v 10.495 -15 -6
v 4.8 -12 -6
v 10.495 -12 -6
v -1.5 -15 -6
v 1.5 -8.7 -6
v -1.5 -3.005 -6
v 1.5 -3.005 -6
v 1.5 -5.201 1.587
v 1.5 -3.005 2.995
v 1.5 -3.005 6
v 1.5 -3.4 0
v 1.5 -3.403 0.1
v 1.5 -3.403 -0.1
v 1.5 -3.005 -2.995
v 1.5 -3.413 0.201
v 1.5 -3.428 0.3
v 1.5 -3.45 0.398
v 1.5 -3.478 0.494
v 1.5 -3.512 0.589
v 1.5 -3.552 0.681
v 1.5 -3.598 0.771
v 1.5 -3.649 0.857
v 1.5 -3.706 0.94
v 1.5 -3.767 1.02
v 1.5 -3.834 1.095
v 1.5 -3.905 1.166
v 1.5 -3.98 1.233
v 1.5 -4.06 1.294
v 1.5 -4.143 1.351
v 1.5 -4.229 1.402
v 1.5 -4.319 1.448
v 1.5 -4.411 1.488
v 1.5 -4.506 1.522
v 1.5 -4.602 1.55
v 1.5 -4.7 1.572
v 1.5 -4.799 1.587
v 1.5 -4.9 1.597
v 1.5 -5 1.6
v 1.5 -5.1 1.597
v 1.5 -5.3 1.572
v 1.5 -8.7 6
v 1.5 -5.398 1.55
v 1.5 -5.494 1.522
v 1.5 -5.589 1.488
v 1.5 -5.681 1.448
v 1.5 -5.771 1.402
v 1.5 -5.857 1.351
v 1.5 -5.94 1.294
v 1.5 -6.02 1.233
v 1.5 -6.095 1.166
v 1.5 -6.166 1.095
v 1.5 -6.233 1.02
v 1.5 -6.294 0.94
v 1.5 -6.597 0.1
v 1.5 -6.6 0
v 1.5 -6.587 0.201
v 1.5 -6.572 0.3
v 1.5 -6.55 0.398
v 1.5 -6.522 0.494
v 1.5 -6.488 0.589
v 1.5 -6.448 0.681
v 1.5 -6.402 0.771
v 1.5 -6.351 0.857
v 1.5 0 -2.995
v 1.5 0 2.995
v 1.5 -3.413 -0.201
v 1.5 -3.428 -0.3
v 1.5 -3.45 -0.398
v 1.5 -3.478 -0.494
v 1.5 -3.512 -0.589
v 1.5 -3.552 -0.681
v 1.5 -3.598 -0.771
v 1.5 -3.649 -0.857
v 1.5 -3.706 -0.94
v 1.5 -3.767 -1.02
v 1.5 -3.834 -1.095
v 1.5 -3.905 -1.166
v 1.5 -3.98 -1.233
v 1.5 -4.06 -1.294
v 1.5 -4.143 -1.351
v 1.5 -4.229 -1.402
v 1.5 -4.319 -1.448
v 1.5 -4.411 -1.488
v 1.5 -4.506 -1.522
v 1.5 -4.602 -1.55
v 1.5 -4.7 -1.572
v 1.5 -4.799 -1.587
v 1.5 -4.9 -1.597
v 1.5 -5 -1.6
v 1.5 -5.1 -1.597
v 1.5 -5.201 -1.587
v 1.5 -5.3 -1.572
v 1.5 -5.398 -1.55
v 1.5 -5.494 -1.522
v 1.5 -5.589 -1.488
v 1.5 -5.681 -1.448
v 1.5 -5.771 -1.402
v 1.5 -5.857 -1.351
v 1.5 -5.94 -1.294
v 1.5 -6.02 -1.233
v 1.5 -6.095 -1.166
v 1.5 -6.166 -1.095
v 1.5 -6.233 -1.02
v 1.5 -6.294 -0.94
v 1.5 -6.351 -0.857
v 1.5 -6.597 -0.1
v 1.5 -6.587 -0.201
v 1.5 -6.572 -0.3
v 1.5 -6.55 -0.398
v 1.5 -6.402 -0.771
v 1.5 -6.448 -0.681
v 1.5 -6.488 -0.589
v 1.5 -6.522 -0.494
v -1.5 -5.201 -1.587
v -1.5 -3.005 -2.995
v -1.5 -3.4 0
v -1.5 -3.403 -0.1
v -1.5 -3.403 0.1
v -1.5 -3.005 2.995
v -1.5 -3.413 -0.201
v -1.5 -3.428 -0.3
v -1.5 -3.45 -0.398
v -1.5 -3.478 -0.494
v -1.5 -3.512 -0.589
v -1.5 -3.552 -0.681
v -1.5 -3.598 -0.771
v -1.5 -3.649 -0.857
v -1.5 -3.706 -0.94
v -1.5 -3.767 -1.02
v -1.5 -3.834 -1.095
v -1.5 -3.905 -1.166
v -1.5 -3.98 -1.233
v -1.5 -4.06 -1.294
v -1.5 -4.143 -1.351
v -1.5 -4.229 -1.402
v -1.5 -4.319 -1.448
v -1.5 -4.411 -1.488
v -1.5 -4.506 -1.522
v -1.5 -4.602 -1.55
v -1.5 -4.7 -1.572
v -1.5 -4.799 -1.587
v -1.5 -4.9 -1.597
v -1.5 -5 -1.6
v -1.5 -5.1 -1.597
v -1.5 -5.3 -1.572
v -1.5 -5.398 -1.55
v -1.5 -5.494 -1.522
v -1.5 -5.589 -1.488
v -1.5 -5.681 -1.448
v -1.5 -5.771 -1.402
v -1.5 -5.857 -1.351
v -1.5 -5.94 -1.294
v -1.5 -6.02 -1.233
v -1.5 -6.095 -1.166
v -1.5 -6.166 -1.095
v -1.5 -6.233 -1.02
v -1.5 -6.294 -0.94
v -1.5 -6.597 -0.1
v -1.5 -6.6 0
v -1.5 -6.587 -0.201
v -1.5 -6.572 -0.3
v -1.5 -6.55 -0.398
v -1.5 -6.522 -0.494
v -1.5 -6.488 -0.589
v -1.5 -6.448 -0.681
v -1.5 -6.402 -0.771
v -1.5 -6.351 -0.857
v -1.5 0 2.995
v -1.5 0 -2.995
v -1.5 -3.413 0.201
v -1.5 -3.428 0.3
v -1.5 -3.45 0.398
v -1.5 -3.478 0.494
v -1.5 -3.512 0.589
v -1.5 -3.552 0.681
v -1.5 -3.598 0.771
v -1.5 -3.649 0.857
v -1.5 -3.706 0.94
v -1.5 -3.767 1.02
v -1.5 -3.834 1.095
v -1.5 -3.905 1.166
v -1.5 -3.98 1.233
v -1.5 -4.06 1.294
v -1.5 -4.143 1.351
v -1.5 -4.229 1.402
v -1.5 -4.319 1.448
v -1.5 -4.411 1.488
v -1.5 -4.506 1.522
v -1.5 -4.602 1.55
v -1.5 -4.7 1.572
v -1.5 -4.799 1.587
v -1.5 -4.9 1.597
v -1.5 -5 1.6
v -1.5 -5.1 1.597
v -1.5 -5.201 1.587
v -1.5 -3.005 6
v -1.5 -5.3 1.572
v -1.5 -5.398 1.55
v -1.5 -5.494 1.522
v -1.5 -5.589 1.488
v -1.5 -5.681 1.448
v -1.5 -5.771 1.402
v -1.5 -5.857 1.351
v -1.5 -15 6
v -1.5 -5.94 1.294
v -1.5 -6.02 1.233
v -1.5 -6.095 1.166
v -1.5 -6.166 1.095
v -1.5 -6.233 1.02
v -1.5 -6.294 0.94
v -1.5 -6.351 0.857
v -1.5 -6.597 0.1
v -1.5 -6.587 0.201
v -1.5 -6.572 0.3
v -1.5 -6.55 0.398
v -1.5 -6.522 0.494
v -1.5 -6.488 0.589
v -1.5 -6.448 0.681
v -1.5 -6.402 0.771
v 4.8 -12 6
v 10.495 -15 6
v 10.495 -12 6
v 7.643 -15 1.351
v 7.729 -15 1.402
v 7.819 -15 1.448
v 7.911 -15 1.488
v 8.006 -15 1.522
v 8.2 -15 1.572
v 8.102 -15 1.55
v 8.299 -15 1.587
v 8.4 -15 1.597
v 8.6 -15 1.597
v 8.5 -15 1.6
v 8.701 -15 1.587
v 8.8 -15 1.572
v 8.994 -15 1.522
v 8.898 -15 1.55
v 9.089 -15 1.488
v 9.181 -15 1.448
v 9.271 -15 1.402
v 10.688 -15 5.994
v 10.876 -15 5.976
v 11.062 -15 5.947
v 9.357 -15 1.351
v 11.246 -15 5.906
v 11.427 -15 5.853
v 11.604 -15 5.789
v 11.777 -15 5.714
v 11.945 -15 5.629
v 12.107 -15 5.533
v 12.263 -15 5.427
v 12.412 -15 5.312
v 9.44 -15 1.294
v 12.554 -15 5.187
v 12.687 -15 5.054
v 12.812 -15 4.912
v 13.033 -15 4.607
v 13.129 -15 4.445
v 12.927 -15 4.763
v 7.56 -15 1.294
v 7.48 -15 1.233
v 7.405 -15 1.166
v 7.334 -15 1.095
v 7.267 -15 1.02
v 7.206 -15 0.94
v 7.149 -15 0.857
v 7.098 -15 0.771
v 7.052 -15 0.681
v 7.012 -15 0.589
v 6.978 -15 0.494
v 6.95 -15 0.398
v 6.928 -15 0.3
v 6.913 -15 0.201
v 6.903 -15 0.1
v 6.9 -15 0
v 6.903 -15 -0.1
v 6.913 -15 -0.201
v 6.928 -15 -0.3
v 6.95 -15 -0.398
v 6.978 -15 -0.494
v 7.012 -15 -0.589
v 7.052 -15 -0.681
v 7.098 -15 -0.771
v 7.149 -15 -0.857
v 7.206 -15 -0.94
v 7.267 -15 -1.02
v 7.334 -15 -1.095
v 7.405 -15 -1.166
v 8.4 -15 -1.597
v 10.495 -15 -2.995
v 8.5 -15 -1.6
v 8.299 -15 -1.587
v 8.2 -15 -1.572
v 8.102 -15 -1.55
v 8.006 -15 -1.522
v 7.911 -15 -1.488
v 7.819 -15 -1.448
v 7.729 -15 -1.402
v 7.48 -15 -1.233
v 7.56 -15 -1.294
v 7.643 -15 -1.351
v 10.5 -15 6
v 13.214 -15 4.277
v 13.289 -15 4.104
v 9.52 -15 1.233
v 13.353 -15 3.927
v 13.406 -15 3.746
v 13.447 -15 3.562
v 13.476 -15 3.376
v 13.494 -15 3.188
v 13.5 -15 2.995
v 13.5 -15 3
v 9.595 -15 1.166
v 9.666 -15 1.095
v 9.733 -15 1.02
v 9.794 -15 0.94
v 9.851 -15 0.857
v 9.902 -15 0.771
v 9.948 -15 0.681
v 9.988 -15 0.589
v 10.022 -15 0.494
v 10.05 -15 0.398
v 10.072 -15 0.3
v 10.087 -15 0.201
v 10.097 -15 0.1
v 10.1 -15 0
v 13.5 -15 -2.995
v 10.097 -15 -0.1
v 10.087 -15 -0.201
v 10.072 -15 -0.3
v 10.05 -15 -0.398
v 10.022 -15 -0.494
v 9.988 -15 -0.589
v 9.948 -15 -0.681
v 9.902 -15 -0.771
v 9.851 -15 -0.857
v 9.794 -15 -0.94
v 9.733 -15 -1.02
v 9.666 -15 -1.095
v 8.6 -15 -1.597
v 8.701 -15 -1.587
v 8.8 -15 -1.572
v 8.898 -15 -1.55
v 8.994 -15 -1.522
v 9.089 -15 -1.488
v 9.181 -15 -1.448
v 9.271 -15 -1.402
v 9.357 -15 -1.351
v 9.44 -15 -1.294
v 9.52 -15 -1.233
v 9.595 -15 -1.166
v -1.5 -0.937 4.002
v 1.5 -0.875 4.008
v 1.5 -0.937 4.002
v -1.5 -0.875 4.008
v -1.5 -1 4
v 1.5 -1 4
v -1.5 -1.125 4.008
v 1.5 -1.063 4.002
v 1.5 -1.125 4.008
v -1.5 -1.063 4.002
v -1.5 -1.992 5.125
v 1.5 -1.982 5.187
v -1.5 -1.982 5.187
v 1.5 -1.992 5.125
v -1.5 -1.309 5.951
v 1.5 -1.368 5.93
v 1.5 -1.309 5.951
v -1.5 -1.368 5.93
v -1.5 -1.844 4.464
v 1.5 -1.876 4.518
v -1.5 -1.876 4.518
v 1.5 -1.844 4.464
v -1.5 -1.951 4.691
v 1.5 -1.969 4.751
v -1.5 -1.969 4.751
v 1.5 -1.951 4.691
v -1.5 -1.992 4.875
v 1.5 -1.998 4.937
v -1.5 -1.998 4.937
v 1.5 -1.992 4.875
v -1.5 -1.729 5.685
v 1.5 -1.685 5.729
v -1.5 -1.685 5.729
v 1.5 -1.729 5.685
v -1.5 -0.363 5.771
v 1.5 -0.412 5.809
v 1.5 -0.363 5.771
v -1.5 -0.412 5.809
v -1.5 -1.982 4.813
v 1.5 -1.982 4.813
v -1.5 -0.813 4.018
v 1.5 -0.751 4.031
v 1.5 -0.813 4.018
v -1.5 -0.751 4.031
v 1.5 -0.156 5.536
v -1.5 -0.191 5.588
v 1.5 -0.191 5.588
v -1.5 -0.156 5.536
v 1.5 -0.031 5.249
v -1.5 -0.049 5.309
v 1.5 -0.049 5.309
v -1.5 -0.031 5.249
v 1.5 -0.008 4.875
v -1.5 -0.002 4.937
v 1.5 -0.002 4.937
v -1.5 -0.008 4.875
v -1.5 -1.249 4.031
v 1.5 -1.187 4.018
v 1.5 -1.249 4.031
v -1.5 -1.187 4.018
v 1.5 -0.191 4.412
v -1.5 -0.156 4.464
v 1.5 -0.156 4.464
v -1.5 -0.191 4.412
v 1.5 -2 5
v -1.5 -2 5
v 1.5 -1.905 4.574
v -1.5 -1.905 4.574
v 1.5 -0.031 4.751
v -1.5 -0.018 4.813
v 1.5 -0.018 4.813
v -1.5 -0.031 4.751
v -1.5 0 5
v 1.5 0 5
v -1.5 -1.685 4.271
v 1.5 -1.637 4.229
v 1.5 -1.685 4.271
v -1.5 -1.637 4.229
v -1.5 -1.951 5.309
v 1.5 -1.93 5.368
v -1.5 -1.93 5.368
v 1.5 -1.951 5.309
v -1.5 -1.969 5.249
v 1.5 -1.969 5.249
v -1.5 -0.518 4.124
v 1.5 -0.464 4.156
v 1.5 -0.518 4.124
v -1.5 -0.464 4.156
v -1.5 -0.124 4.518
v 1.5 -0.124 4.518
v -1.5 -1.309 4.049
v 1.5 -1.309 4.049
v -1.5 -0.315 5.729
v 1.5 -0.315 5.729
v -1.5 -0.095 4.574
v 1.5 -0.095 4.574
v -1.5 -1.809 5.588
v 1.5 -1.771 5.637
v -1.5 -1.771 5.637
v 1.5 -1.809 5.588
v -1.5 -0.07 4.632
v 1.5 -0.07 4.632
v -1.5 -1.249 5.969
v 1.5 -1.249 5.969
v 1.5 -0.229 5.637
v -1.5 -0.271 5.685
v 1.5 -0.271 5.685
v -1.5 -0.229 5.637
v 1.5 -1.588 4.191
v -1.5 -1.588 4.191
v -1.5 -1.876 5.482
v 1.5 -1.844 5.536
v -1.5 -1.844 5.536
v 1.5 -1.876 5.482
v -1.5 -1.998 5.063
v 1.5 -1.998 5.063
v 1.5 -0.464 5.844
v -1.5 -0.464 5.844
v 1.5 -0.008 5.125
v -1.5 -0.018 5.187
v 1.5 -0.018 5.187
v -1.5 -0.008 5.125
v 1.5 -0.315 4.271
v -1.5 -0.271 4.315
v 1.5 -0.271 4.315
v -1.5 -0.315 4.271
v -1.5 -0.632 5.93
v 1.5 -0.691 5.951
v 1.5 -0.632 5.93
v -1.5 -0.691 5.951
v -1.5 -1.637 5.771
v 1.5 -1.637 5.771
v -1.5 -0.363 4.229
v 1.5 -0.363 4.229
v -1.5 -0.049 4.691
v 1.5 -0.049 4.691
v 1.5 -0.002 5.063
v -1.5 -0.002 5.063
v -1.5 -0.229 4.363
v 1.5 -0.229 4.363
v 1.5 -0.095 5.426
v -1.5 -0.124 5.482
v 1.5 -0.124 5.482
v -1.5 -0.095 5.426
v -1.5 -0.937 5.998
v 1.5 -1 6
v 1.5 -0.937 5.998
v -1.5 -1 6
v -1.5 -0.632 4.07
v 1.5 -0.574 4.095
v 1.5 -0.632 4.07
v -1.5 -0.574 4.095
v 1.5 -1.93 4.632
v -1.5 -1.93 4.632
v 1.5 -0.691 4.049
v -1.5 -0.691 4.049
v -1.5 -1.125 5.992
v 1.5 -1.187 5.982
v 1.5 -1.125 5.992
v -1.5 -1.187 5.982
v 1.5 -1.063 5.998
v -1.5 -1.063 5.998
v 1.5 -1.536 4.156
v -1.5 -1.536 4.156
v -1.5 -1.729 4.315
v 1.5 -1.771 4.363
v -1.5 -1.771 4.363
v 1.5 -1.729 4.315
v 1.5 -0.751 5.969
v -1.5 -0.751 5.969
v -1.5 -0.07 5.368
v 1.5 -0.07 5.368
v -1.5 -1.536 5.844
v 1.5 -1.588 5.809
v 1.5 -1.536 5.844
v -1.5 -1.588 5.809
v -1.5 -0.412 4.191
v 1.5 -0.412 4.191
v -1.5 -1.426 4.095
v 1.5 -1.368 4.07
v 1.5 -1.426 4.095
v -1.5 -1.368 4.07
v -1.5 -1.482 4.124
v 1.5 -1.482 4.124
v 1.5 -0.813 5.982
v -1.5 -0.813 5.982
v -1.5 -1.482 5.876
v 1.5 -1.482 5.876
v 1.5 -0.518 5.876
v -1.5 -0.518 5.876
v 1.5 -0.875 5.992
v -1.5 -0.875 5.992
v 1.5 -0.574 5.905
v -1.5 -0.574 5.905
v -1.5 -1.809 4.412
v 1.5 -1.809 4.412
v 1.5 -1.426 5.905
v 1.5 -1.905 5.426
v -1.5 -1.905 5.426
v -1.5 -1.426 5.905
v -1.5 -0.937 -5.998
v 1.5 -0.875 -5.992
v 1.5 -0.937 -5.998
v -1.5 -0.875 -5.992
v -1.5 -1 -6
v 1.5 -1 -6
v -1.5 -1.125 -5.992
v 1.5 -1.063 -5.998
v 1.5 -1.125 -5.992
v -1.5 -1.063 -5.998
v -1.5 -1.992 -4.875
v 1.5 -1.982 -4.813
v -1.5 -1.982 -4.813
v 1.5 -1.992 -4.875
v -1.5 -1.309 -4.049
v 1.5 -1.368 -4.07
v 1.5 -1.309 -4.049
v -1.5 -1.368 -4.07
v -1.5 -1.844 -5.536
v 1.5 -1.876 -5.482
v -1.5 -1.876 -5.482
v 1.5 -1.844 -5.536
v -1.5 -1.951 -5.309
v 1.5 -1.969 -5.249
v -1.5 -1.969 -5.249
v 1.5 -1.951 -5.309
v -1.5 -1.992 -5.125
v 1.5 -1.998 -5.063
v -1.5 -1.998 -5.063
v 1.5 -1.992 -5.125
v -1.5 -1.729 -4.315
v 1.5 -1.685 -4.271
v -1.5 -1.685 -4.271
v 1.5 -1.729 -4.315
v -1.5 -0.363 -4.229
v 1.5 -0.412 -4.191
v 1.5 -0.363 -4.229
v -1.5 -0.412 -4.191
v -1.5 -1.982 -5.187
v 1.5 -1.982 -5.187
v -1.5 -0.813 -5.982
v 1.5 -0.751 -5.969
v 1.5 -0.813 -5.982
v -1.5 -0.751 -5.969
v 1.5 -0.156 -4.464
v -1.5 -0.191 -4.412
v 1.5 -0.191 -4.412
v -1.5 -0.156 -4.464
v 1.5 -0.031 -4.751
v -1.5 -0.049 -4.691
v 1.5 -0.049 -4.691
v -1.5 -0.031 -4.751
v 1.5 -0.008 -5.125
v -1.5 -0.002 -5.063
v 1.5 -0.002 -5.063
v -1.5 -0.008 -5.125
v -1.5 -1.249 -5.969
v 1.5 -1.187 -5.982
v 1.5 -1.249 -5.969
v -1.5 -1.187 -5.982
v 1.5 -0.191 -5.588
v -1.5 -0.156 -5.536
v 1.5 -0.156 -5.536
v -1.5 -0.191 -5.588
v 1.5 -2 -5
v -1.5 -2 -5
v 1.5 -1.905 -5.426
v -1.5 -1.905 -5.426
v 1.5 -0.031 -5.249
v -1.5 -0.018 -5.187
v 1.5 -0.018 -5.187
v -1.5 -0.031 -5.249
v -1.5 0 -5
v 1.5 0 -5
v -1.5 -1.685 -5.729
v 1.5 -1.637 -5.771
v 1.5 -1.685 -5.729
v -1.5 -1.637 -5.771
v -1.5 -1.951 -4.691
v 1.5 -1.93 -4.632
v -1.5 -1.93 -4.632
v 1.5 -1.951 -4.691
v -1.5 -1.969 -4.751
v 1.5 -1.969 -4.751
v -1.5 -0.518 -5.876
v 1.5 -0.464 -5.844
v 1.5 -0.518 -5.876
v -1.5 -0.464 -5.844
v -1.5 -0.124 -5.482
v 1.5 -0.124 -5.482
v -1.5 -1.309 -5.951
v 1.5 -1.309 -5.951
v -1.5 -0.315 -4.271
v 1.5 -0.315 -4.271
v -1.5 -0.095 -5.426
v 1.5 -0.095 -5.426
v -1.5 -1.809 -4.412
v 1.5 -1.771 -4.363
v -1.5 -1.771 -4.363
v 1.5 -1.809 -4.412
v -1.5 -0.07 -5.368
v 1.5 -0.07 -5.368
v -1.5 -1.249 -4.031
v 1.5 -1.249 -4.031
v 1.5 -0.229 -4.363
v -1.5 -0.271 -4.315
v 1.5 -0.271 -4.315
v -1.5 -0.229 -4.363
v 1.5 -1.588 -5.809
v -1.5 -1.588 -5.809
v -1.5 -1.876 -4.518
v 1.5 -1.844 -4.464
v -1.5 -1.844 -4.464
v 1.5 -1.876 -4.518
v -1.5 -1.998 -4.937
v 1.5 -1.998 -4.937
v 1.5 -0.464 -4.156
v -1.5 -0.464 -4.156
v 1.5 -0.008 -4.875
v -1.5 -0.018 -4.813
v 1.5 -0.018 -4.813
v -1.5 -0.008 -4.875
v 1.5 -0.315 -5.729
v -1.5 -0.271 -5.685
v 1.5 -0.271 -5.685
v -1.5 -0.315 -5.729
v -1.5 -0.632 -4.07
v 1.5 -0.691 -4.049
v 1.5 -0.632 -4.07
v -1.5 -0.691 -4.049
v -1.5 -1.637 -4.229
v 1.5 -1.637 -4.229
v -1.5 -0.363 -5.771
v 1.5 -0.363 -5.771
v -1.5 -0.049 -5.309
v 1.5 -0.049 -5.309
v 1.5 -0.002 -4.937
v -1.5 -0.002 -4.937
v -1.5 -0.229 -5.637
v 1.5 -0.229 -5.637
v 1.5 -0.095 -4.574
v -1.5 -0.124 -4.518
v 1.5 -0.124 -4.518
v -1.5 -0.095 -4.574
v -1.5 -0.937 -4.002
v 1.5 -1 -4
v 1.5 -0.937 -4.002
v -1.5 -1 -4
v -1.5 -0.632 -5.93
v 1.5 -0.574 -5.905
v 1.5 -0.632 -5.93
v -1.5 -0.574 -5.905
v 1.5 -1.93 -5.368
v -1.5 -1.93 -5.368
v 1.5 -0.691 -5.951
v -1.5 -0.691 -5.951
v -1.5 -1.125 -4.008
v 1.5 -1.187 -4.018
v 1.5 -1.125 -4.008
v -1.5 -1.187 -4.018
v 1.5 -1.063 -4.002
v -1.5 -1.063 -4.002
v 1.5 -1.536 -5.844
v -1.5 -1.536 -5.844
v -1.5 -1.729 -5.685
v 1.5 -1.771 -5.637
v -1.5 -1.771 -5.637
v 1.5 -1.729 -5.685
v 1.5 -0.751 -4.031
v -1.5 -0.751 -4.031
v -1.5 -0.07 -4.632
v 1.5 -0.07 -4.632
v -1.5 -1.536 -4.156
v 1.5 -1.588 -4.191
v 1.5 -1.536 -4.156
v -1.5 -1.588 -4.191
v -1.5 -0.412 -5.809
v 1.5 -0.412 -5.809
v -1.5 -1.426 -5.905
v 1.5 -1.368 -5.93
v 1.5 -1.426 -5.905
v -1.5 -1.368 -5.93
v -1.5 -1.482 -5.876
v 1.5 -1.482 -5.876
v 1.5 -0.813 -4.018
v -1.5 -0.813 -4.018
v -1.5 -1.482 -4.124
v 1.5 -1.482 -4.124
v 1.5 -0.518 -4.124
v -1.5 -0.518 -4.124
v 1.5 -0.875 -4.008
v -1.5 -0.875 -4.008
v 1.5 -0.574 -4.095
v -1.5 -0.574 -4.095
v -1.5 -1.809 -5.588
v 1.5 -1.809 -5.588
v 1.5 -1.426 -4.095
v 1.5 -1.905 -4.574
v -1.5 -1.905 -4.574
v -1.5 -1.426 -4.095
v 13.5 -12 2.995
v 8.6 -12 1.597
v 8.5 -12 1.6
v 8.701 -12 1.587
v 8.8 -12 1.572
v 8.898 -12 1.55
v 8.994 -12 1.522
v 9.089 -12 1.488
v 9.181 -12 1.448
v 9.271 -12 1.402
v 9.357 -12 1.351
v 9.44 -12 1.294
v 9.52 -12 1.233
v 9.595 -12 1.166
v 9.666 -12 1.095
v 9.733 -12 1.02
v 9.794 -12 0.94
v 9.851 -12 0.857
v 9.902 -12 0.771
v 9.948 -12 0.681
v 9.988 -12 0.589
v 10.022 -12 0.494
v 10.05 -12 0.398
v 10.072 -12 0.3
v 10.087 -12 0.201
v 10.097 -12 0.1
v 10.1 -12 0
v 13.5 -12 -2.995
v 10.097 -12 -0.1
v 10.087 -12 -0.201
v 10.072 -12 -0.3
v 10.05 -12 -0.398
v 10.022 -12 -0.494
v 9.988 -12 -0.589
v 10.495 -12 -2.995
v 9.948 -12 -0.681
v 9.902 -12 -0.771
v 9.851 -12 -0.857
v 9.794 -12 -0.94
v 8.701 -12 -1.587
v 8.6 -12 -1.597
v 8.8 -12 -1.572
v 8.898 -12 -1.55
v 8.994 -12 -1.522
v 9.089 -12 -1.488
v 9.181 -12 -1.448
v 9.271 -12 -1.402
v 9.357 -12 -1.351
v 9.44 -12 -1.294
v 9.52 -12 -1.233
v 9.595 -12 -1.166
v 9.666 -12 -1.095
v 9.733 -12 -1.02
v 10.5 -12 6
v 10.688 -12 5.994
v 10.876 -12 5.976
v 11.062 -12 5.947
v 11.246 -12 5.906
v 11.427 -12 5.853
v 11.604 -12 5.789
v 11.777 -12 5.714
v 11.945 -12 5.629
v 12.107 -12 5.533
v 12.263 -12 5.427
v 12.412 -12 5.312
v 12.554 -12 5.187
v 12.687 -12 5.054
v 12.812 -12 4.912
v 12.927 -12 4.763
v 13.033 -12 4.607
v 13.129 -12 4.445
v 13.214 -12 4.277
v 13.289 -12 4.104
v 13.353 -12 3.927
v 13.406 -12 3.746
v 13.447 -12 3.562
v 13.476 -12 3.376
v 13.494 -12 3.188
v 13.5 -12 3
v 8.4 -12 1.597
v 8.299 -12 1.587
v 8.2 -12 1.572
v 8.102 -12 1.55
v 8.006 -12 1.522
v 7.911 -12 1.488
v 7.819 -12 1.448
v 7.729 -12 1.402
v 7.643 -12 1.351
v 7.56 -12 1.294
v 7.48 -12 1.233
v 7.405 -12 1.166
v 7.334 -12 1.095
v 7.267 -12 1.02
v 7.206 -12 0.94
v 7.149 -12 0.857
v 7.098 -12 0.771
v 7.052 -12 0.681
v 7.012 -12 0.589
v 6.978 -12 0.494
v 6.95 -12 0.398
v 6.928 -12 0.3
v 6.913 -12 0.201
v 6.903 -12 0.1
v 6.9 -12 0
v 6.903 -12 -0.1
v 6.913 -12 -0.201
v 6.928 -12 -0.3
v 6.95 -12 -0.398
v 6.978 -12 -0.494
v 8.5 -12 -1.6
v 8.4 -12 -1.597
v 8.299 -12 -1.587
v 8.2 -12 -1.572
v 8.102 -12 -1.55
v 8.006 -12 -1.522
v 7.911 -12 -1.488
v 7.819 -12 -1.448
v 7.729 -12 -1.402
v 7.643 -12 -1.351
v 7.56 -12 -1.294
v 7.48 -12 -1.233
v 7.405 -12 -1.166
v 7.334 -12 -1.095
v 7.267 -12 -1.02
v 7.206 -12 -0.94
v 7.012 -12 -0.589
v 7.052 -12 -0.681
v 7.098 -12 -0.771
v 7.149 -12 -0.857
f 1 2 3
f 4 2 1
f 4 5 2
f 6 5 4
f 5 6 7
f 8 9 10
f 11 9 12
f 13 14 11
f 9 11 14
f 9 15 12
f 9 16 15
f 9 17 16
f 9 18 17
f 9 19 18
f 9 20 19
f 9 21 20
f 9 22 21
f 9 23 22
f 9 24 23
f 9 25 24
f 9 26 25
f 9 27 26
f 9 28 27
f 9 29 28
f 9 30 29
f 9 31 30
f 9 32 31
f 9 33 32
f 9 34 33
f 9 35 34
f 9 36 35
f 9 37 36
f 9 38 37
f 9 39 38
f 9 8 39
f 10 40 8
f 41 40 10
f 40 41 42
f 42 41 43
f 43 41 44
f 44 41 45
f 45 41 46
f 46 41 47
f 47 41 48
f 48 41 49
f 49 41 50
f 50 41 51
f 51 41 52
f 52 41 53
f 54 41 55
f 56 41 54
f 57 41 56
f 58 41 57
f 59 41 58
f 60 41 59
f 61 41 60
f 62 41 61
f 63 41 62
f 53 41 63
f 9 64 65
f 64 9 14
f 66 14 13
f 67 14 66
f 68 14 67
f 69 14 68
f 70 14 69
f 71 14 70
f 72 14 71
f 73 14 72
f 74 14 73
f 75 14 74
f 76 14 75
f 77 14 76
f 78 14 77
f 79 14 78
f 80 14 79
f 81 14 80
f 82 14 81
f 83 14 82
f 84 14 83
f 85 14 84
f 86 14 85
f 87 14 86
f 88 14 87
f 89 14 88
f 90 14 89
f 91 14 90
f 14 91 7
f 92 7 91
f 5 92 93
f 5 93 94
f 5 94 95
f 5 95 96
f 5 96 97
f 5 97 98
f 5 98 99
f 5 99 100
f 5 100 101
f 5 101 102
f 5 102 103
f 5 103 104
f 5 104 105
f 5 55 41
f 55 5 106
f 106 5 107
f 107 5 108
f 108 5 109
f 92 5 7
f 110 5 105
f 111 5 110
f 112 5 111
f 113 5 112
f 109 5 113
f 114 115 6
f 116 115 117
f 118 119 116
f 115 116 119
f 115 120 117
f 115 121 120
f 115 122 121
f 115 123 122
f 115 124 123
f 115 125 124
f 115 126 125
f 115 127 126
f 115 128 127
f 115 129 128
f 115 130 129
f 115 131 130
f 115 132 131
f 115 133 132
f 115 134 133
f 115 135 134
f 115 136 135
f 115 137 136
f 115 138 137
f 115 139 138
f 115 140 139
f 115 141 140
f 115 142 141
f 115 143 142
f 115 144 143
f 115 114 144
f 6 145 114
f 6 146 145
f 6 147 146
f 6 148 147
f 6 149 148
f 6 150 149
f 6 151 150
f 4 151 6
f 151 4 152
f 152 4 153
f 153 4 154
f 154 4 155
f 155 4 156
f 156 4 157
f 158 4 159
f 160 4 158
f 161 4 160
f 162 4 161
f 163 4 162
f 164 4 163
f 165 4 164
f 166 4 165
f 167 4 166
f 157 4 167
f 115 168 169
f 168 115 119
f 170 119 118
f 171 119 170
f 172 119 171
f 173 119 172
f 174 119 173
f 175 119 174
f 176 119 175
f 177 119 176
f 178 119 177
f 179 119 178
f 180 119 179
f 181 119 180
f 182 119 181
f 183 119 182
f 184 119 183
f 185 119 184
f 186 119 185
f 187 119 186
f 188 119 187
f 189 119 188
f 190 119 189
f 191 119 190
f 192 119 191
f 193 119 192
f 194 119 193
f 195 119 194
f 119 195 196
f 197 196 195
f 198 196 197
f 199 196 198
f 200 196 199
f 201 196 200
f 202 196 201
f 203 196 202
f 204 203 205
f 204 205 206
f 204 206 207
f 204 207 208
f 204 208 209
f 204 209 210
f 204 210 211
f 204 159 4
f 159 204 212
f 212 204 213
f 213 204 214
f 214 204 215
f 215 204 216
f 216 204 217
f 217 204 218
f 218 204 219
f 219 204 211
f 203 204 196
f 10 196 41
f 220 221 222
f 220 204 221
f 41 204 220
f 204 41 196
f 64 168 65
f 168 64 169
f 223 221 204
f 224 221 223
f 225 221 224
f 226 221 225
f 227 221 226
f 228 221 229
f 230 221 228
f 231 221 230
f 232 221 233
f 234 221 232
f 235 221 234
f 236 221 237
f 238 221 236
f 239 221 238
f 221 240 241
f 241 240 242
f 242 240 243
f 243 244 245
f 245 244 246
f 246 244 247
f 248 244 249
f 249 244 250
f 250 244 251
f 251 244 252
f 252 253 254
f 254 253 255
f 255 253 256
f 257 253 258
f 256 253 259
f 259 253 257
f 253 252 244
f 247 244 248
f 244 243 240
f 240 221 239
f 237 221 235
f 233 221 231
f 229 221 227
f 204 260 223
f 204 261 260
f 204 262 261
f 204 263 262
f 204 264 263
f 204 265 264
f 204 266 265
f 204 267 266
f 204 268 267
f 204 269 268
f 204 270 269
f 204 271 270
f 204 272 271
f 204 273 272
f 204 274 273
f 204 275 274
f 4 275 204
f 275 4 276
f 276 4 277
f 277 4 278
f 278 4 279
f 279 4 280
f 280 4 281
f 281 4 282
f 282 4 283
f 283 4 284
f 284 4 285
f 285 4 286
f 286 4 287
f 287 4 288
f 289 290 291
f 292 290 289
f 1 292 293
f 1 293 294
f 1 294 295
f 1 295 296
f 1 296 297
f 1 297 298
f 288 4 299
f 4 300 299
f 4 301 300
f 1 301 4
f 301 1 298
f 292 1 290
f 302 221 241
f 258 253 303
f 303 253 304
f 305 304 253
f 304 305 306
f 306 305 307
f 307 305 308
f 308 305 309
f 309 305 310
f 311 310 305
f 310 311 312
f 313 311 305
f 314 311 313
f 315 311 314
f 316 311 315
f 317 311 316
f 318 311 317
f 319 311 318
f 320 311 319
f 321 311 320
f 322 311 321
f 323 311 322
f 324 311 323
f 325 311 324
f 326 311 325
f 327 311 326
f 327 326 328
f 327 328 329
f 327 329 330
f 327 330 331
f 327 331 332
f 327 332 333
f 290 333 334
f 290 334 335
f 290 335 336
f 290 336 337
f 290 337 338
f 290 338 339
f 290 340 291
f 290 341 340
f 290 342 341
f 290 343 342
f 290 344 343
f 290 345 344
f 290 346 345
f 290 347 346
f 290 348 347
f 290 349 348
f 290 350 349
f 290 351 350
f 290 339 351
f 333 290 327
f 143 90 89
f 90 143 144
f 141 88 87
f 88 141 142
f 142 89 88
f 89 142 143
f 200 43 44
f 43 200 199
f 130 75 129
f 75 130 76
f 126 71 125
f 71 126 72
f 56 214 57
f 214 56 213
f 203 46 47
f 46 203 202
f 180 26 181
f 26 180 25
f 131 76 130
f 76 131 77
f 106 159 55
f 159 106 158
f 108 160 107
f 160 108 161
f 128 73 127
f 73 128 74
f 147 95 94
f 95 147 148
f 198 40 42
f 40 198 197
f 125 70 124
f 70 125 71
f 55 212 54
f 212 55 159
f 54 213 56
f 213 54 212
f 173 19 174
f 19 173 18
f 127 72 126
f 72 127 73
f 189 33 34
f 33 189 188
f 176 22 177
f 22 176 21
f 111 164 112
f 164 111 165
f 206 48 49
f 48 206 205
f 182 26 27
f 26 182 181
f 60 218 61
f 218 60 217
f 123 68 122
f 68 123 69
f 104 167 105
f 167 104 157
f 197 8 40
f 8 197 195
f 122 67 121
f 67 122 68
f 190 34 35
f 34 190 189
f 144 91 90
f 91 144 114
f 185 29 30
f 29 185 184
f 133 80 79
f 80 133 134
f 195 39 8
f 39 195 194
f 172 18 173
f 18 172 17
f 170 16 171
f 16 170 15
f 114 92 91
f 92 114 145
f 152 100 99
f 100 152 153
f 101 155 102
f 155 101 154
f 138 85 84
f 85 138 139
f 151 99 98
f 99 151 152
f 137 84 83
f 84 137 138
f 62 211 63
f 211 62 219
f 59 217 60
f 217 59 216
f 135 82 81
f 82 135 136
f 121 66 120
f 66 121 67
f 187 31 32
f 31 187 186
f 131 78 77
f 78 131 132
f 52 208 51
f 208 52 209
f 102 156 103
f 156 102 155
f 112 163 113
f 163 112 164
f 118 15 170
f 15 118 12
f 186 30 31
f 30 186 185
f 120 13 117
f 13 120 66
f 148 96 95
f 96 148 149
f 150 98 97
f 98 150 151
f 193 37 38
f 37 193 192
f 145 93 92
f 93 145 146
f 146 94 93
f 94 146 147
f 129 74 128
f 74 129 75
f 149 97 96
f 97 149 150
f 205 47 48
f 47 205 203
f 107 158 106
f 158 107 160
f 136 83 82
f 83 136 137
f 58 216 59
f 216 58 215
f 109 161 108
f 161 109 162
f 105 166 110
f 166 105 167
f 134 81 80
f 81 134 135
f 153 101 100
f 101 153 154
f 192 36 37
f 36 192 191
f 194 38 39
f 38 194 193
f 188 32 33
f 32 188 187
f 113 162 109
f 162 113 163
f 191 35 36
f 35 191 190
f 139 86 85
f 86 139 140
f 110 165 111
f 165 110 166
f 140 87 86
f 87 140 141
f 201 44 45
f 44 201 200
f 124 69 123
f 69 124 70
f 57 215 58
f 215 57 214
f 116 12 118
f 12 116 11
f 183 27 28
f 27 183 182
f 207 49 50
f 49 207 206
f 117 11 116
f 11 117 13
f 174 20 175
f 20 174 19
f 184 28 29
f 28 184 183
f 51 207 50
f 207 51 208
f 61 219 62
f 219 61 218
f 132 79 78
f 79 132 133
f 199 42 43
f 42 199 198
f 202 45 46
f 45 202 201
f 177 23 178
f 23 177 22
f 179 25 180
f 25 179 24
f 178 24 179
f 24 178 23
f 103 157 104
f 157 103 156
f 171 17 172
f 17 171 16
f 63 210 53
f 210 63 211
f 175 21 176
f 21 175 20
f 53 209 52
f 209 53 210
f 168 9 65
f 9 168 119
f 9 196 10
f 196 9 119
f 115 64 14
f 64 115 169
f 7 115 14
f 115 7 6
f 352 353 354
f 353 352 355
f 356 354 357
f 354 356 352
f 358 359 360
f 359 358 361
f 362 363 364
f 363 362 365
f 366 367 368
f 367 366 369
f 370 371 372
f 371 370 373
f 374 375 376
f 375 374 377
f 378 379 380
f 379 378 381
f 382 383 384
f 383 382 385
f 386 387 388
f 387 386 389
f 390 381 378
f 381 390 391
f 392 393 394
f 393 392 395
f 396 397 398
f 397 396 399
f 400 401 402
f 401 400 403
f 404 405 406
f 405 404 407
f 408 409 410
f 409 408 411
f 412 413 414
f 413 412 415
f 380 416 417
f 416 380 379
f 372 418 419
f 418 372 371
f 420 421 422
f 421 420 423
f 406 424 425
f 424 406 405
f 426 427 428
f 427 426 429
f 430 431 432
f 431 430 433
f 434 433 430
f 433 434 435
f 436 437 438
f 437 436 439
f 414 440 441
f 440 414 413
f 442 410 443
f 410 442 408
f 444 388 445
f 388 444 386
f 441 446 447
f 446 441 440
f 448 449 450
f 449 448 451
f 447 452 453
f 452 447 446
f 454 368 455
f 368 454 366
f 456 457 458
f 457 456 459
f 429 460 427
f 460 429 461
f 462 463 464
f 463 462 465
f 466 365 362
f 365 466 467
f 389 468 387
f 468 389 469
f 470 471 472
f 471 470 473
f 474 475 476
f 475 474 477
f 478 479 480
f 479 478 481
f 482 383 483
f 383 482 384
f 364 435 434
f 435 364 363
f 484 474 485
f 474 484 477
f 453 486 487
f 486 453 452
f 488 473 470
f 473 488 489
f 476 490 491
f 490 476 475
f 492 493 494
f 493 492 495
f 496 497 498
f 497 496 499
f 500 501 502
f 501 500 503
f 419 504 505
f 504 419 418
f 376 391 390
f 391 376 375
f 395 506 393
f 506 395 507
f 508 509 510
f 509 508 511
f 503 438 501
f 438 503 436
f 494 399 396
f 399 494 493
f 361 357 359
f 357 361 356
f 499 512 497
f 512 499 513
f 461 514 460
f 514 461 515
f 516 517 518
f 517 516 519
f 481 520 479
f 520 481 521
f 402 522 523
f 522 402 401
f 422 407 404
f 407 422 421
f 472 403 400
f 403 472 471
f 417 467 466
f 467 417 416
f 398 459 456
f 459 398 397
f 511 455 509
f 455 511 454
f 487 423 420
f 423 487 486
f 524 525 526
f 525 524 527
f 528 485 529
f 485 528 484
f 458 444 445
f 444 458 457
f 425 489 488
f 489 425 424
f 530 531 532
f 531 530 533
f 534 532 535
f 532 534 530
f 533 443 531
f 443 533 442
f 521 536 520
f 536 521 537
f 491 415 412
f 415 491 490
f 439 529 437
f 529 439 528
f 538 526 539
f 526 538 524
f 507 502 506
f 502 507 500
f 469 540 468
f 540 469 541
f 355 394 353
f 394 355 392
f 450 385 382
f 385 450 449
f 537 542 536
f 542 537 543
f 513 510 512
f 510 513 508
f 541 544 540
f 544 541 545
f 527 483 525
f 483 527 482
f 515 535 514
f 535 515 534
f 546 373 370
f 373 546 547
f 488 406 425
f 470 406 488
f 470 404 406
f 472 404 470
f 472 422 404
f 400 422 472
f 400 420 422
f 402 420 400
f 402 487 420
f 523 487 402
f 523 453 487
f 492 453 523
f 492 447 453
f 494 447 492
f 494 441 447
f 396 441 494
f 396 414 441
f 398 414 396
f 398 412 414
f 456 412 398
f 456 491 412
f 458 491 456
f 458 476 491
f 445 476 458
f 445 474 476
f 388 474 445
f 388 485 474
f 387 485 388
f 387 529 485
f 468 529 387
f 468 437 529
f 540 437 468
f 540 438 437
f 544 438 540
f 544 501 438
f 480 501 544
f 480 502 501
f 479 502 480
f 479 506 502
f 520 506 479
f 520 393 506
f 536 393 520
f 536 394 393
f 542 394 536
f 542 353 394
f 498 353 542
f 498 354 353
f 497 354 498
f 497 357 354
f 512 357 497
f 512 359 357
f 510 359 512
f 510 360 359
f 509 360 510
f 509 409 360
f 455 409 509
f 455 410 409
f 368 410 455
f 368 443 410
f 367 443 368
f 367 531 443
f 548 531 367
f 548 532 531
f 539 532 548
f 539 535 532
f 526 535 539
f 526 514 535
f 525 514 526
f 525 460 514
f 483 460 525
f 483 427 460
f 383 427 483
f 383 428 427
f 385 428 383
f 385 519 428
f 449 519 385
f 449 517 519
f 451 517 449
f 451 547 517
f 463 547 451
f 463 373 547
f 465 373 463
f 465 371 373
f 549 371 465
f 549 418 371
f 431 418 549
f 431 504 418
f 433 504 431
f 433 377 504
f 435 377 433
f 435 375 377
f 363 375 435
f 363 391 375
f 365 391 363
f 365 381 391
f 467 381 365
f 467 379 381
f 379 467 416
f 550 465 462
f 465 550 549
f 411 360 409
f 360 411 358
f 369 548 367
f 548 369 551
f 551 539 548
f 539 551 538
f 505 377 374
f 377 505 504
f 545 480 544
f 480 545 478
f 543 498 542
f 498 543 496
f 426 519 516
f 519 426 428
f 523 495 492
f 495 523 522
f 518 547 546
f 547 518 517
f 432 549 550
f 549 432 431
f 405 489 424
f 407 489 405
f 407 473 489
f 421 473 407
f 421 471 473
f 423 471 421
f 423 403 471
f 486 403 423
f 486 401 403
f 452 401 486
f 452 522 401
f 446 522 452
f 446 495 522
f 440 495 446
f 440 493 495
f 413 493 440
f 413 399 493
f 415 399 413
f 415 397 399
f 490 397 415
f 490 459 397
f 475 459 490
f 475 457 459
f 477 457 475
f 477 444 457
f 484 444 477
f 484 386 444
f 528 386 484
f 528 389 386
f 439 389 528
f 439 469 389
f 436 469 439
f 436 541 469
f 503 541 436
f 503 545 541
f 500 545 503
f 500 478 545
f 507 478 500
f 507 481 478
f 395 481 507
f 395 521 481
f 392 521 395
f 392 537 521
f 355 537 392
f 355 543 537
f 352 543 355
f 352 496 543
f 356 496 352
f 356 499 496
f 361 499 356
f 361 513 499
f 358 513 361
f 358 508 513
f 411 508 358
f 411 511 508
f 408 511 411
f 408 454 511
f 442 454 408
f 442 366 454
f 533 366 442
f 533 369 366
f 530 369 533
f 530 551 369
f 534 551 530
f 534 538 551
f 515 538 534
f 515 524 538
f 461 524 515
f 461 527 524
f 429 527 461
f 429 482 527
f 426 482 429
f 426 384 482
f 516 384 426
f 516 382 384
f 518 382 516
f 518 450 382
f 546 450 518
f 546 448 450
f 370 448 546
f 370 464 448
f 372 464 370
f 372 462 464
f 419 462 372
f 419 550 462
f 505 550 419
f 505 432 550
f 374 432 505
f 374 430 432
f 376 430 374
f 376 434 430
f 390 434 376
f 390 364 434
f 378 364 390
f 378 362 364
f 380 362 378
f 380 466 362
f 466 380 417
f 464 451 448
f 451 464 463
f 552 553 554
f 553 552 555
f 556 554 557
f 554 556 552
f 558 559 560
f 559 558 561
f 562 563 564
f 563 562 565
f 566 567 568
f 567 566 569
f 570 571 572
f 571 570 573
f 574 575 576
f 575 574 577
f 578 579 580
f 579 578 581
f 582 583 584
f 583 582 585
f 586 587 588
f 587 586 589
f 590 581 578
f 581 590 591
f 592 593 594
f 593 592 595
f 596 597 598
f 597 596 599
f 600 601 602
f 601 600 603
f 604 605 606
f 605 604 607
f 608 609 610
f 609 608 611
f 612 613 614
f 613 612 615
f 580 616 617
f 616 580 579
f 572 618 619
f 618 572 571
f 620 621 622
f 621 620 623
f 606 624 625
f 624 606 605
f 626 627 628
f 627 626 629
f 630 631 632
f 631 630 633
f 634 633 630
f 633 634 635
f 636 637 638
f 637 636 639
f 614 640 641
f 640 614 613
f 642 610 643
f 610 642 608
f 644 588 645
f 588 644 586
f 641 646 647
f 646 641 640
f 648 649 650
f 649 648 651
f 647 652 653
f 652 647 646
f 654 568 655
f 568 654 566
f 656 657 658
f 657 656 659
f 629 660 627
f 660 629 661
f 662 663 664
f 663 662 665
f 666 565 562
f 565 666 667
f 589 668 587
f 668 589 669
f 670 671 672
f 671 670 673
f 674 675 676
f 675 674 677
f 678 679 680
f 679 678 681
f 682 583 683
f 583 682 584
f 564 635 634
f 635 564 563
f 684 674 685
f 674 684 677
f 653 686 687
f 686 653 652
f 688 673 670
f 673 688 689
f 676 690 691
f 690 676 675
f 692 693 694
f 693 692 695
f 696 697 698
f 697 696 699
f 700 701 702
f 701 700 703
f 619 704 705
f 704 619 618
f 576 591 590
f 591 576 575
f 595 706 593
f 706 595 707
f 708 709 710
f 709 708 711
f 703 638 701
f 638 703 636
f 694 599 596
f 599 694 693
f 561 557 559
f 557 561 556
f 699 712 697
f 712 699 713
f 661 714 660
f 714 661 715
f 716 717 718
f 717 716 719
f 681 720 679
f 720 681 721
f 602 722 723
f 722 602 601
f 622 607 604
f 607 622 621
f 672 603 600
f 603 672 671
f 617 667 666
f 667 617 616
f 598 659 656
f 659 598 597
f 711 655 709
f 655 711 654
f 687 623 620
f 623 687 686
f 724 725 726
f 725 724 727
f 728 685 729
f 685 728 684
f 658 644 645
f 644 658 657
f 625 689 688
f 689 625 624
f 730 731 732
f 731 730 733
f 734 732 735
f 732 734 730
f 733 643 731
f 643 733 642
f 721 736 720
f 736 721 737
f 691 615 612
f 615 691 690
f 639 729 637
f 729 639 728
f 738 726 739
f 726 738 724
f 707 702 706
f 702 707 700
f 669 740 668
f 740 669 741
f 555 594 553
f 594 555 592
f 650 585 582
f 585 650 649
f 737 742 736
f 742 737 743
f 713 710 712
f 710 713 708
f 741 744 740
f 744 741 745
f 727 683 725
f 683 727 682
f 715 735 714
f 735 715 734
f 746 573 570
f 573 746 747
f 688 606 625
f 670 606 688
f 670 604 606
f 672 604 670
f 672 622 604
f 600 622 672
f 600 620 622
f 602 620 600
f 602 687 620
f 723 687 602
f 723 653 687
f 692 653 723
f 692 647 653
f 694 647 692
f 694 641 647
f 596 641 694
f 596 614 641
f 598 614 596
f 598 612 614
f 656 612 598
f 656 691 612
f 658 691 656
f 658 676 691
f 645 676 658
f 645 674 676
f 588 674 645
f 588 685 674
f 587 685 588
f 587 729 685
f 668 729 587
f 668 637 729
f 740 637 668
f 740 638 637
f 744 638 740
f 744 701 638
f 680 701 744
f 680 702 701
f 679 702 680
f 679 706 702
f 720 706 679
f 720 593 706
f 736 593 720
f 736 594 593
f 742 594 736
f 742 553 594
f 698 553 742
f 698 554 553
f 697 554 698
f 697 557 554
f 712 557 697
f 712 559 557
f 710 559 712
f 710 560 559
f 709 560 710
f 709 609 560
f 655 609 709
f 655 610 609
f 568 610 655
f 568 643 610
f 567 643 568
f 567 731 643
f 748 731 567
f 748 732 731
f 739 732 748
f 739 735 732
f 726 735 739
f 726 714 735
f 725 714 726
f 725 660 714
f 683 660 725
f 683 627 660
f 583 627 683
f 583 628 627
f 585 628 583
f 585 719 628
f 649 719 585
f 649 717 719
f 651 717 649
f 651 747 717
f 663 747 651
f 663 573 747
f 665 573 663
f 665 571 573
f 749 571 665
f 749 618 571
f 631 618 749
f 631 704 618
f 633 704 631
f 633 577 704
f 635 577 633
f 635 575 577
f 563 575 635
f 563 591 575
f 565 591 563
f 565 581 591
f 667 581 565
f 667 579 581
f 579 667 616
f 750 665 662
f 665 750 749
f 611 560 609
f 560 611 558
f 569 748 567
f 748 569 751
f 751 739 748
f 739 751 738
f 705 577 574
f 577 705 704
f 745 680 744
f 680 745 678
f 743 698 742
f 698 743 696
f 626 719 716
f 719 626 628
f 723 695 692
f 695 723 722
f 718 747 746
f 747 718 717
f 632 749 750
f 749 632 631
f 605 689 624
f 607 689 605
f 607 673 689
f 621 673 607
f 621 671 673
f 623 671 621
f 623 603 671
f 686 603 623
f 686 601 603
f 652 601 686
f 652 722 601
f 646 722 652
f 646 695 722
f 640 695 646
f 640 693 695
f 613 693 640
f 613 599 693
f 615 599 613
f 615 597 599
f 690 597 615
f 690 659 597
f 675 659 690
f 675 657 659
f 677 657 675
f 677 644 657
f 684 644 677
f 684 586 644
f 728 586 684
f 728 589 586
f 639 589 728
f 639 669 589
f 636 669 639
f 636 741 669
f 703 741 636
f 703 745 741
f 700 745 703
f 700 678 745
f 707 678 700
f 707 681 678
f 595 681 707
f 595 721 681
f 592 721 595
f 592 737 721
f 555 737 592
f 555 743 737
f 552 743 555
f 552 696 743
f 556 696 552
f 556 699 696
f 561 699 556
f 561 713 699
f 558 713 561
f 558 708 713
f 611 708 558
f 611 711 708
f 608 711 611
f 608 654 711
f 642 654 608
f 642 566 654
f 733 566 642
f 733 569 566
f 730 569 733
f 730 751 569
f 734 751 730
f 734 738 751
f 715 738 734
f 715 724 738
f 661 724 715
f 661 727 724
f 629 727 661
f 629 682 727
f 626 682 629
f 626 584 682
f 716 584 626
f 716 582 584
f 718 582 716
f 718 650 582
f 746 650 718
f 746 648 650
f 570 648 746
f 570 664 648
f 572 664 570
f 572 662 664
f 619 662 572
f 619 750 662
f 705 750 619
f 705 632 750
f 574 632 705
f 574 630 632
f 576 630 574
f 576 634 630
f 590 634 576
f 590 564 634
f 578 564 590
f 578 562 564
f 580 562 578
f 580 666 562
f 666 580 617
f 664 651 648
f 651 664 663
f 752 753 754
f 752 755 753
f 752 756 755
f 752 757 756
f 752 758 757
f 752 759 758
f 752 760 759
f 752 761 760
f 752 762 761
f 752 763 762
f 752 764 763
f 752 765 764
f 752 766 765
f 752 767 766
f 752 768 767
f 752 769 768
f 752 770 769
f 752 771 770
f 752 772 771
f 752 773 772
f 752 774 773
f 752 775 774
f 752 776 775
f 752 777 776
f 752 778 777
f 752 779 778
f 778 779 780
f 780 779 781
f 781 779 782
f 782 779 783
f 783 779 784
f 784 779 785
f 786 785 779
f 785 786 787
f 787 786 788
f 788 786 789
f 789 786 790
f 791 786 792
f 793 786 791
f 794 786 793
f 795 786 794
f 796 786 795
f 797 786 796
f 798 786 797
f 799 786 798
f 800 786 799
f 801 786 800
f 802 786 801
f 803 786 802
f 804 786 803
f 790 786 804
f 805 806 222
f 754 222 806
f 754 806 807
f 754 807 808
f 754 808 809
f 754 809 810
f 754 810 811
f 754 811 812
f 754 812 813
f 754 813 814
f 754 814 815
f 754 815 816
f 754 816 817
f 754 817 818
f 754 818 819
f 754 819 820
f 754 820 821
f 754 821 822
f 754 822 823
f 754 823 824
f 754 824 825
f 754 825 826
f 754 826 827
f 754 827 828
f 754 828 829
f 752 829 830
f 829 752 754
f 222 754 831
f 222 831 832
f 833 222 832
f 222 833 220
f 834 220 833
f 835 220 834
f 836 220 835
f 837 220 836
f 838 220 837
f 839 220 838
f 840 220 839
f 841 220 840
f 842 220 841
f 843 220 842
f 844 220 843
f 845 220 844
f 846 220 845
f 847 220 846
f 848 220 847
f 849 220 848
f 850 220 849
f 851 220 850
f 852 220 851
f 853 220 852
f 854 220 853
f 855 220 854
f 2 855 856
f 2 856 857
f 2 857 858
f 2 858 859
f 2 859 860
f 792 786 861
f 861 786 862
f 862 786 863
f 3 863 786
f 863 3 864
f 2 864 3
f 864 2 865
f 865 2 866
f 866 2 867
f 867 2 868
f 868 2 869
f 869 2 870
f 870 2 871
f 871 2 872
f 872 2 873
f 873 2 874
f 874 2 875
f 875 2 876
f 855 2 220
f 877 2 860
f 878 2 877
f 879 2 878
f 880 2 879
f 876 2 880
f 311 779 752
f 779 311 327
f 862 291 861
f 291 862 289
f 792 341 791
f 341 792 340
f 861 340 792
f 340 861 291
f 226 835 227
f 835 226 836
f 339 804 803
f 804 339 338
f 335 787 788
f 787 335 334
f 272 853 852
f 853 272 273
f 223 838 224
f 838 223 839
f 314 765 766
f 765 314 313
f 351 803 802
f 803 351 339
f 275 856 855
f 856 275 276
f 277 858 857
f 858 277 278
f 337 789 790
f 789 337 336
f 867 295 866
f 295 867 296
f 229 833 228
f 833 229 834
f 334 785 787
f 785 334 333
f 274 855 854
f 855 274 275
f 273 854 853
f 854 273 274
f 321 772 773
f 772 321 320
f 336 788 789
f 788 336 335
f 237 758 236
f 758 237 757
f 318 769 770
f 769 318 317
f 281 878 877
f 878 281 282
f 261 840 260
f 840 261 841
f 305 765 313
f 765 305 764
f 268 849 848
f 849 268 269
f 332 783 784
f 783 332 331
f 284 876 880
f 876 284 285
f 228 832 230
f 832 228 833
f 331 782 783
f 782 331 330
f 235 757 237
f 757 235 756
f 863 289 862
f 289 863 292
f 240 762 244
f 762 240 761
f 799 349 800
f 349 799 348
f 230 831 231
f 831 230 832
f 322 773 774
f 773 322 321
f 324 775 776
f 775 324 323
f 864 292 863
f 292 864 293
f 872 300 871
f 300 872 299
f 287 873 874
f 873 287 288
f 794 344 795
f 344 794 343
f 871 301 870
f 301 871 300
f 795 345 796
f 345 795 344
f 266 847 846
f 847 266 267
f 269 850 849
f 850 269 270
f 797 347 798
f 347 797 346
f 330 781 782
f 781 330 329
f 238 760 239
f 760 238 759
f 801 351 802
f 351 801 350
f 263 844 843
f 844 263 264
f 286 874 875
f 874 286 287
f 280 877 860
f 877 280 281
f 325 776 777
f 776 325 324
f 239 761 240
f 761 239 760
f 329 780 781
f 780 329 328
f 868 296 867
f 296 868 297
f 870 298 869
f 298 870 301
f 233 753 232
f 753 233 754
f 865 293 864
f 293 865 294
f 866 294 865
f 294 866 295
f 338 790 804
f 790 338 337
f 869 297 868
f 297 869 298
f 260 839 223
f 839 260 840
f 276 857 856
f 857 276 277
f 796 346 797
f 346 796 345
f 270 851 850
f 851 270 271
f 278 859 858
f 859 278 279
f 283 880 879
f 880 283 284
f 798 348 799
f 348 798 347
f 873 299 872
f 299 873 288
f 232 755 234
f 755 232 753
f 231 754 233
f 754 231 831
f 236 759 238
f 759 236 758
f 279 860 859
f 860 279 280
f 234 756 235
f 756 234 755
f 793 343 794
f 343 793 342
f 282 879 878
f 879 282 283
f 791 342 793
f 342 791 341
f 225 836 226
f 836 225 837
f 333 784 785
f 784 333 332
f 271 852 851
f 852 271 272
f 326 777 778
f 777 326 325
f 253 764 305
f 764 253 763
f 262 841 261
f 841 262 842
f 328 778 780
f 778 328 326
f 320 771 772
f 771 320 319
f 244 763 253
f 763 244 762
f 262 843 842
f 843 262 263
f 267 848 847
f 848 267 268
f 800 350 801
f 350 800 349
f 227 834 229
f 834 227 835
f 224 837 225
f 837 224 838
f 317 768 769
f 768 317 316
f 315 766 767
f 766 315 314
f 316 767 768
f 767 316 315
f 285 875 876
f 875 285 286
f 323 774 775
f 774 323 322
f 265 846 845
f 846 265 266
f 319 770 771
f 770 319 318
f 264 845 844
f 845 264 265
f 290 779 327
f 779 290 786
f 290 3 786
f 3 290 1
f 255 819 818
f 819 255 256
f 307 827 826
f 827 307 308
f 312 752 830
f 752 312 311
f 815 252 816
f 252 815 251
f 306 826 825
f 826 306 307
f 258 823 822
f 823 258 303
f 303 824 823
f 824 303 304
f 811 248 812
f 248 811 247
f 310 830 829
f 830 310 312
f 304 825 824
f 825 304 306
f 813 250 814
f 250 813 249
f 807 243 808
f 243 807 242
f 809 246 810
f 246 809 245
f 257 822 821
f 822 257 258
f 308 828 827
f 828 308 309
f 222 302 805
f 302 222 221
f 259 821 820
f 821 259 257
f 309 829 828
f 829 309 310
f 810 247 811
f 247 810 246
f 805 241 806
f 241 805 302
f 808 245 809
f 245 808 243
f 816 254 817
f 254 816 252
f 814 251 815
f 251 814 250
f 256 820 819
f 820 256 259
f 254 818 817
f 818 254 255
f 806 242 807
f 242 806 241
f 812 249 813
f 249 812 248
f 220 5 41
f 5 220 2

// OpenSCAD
$fn=100;
rotate(a=[0,90,0])

union(){

difference() {
  translate([0,-7.5,0]) cube([12,15,3],center=true);
  translate([0,-5,0]) cylinder(r=1.5+0.1,h=3+0.01, center=true);
  translate([-4.5,-1.5,0]) cube([3.01,3.01,3.01],center=true);
  translate([4.5,-1.5,0]) cube([3.01,3.01,3.01],center=true);
}

corner_radius=1;

translate([-3-corner_radius*2,-3+corner_radius*2,0])
{ 
difference(){
  cylinder(r=corner_radius,h=3, center=true);
  translate([-3,-3,-1.6]) cube([6-5-0.01,3-0.01,3.2]);
  }
}


translate([3+corner_radius*2,-3+corner_radius*2,0])
{
difference(){
cylinder(r=corner_radius,h=3, center=true);
translate([-3,-3,-1.6])
cube([6-5-0.01,3-0.01,3.2]);
}
}

translate([0,-13.5,13.5])
rotate(a=[90,0,0]){
difference() {
translate([0,-7.5,0])
cube([12,15,3],center=true);
translate([0,-5,0])
  cylinder(r=1.5+0.1,h=3+0.01, center=true);
translate([-4.5,-1.5,0])
cube([3.01,3.01,3.01],center=true);
translate([4.5,-1.5,0])
cube([3.01,3.01,3.01],center=true);
}

translate([-3,-3,0])
{
difference(){
cylinder(r=3,h=3, center=true);
translate([-3,-3,-1.6])
cube([6-0.01,3-0.01,3.2]);
}
}
/*
translate([3,-3,0])
{
difference(){
  cylinder(r=3,h=3, center=true);
  translate([-3,-3,-1.6]) cube([6-0.01,3-0.01,3.2]);
  }
}
*/
}
hull(){
translate([6,-12-.1,1.5-.1])
rotate(a=[0,0,90])
prism(1, 3.5, 3.5);
translate([-5,-12-.1,1.5-.1])
rotate(a=[0,0,90])
prism(1, 3.5, 3.5);

}
}



module prism(l, w, h) {
	translate([0, l, 0]) rotate( a= [90, 0, 0]) 
	linear_extrude(height = l) polygon(points = [
		[0, 0],
		[w, 0],
		[0, h]
	], paths=[[0,1,2,0]]);
}
